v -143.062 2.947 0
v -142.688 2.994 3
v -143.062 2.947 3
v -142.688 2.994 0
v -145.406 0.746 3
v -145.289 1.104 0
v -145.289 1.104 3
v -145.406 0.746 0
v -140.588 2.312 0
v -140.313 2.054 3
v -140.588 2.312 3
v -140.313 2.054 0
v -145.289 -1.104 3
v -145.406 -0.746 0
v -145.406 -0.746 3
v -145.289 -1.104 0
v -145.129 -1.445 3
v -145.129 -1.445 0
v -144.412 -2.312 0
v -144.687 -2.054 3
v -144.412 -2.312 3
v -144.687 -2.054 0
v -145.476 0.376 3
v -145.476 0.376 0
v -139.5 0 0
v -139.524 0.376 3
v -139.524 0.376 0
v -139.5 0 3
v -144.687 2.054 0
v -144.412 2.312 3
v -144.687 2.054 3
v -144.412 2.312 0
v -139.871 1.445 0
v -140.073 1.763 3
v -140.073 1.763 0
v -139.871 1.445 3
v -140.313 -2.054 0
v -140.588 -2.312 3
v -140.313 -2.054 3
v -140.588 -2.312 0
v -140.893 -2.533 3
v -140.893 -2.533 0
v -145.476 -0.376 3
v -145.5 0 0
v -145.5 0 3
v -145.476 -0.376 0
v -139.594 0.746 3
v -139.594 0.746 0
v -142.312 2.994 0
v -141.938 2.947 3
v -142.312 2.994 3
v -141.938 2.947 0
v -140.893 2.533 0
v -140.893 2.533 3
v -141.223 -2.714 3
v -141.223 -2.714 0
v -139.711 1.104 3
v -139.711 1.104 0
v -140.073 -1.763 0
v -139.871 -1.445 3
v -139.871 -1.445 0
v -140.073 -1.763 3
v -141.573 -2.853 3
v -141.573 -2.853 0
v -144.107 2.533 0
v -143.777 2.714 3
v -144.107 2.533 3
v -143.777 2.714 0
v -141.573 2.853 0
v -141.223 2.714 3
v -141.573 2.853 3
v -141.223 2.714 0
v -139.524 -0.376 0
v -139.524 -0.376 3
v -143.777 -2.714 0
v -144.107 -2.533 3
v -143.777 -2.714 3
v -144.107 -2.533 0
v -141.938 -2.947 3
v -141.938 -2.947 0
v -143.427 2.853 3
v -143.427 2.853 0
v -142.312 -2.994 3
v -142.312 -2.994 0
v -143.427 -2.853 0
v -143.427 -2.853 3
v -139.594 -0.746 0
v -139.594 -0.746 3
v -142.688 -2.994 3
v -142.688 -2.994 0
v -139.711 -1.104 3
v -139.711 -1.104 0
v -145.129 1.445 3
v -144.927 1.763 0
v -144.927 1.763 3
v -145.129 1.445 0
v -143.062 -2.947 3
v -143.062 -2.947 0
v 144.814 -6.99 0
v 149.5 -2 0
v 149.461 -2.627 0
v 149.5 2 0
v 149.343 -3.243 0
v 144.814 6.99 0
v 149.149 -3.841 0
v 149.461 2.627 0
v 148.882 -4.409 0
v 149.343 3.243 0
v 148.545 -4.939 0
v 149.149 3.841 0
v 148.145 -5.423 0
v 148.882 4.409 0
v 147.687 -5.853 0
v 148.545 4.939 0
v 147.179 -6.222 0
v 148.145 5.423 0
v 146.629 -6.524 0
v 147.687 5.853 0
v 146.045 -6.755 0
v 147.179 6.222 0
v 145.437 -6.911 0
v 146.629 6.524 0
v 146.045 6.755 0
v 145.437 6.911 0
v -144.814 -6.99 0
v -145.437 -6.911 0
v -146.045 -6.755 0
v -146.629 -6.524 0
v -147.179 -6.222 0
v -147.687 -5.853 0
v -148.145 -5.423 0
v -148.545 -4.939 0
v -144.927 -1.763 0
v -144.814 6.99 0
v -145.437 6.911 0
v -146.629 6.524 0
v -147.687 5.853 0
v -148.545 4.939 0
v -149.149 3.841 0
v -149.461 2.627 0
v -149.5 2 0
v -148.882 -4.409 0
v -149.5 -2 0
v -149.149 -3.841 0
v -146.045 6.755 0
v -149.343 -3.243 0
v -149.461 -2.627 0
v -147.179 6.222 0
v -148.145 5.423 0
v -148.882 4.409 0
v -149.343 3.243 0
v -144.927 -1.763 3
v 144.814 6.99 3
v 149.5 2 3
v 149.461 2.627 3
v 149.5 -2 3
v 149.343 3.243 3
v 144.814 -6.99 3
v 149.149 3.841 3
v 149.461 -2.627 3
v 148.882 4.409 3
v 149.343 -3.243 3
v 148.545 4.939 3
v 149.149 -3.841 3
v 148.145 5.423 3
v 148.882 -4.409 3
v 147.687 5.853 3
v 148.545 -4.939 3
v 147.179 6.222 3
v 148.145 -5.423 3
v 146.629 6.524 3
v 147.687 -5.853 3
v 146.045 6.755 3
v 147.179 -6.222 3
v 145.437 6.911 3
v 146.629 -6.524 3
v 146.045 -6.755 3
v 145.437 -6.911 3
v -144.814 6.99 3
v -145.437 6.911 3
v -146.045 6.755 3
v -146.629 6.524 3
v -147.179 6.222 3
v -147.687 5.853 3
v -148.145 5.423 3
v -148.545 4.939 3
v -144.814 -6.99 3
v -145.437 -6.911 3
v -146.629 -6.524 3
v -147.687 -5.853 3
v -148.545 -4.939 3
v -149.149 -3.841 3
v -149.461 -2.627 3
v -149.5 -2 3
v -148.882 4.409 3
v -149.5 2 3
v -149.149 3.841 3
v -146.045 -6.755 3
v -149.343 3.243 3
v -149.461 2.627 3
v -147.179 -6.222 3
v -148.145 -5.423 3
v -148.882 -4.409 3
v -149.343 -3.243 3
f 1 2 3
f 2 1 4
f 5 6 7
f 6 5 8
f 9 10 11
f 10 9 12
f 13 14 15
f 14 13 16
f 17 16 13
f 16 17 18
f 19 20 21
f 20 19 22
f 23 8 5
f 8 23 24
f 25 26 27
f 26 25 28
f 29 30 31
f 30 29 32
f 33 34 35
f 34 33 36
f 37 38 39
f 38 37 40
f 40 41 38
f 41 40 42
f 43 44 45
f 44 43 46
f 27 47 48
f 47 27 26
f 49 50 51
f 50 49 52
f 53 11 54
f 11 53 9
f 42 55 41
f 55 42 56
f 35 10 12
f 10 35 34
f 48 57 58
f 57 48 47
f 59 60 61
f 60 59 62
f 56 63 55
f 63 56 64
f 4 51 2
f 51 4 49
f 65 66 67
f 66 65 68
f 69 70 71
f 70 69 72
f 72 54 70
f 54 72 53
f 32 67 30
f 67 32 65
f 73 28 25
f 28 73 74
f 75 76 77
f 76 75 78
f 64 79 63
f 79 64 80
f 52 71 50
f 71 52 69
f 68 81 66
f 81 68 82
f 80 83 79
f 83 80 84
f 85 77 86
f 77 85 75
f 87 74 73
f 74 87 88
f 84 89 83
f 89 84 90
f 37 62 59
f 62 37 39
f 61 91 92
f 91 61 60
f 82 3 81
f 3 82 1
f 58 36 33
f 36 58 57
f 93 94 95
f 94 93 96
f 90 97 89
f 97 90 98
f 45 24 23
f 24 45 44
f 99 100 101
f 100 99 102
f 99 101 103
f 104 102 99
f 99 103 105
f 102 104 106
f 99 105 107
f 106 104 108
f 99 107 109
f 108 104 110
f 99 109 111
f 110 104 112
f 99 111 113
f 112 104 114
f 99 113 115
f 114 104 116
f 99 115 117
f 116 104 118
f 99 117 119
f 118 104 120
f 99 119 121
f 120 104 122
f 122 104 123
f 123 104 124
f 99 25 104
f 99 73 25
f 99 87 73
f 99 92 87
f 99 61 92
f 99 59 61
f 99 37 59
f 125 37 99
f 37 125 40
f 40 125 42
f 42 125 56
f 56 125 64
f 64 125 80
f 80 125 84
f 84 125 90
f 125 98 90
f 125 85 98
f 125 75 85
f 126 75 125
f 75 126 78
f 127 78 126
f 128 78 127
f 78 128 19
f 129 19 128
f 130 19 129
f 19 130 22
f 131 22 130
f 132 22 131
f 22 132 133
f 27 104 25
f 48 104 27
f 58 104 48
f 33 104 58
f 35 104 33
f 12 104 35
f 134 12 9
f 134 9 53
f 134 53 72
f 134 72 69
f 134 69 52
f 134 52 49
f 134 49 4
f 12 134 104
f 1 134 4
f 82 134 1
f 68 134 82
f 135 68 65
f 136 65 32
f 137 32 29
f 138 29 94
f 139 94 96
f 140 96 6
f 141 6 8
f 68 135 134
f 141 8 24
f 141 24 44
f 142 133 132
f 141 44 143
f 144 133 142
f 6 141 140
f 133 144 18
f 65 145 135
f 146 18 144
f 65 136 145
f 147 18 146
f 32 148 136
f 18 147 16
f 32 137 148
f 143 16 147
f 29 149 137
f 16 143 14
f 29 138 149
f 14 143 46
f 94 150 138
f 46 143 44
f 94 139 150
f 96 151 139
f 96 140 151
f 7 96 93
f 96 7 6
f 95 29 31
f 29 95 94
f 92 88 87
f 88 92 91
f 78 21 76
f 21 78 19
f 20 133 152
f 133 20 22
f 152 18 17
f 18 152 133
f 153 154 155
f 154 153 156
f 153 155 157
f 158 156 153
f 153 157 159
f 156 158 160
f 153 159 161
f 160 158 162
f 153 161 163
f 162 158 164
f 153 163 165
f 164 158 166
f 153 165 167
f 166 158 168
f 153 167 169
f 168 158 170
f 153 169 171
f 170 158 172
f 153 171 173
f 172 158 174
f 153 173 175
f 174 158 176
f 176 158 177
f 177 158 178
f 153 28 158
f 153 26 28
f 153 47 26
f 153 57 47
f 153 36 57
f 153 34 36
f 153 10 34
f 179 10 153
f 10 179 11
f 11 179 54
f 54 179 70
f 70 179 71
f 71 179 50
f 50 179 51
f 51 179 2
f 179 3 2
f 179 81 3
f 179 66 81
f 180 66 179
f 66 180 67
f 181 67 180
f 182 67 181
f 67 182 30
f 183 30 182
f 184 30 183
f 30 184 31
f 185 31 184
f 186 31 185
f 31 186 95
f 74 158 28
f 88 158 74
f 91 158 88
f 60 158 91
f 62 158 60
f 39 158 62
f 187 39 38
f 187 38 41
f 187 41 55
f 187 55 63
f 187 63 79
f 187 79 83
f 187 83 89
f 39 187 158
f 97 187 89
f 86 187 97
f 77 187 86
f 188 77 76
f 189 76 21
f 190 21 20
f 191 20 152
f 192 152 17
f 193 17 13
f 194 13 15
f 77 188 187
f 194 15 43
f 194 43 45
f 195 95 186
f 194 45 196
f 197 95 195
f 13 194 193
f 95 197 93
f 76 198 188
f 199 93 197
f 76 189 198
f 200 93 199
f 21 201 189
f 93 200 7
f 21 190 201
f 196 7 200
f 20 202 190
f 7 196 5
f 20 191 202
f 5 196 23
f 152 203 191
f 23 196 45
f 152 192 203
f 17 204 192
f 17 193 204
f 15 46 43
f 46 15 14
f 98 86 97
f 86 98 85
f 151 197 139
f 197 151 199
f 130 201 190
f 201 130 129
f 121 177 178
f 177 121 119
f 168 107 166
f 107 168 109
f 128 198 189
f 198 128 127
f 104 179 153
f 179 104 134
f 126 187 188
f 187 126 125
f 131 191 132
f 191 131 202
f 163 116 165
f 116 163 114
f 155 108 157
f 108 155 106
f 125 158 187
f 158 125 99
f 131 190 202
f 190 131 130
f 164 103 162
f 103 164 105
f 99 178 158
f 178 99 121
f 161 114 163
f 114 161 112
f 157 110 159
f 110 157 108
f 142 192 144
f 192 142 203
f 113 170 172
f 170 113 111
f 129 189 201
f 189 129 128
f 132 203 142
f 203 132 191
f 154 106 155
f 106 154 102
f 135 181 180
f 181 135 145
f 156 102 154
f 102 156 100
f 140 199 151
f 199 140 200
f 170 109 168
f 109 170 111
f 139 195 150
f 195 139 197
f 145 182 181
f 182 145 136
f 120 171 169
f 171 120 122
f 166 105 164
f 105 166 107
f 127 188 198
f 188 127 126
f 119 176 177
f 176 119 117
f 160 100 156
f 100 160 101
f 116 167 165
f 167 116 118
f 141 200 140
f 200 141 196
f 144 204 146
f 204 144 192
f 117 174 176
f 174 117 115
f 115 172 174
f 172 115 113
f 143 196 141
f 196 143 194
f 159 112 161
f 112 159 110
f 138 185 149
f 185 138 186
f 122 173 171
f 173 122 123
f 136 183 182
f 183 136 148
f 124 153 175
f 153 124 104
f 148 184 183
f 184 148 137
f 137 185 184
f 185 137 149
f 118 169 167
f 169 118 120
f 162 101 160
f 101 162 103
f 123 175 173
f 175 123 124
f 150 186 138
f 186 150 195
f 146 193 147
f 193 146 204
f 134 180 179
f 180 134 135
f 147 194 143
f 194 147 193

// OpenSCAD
$fn = 50;


difference() {
	union() {
		hull() {
			translate(v = [-144.5000000000, 2.0000000000, 0]) {
				cylinder(h = 3, r = 5);
			}
			translate(v = [144.5000000000, 2.0000000000, 0]) {
				cylinder(h = 3, r = 5);
			}
			translate(v = [-144.5000000000, -2.0000000000, 0]) {
				cylinder(h = 3, r = 5);
			}
			translate(v = [144.5000000000, -2.0000000000, 0]) {
				cylinder(h = 3, r = 5);
			}
		}
	}
	union() {
		translate(v = [-142.5000000000, 0.0000000000, 0]) {
			cylinder(h = 3, r = 3.0000000000);
		}
		translate(v = [-142.5000000000, 0.0000000000, 0]) {
			cylinder(h = 3, r = 1.5000000000);
		}
		translate(v = [-142.5000000000, 0.0000000000, 0]) {
			cylinder(h = 3, r = 1.5000000000);
		}
		translate(v = [-142.5000000000, 0.0000000000, 0]) {
			cylinder(h = 3, r = 1.5000000000);
		}
	}
}
